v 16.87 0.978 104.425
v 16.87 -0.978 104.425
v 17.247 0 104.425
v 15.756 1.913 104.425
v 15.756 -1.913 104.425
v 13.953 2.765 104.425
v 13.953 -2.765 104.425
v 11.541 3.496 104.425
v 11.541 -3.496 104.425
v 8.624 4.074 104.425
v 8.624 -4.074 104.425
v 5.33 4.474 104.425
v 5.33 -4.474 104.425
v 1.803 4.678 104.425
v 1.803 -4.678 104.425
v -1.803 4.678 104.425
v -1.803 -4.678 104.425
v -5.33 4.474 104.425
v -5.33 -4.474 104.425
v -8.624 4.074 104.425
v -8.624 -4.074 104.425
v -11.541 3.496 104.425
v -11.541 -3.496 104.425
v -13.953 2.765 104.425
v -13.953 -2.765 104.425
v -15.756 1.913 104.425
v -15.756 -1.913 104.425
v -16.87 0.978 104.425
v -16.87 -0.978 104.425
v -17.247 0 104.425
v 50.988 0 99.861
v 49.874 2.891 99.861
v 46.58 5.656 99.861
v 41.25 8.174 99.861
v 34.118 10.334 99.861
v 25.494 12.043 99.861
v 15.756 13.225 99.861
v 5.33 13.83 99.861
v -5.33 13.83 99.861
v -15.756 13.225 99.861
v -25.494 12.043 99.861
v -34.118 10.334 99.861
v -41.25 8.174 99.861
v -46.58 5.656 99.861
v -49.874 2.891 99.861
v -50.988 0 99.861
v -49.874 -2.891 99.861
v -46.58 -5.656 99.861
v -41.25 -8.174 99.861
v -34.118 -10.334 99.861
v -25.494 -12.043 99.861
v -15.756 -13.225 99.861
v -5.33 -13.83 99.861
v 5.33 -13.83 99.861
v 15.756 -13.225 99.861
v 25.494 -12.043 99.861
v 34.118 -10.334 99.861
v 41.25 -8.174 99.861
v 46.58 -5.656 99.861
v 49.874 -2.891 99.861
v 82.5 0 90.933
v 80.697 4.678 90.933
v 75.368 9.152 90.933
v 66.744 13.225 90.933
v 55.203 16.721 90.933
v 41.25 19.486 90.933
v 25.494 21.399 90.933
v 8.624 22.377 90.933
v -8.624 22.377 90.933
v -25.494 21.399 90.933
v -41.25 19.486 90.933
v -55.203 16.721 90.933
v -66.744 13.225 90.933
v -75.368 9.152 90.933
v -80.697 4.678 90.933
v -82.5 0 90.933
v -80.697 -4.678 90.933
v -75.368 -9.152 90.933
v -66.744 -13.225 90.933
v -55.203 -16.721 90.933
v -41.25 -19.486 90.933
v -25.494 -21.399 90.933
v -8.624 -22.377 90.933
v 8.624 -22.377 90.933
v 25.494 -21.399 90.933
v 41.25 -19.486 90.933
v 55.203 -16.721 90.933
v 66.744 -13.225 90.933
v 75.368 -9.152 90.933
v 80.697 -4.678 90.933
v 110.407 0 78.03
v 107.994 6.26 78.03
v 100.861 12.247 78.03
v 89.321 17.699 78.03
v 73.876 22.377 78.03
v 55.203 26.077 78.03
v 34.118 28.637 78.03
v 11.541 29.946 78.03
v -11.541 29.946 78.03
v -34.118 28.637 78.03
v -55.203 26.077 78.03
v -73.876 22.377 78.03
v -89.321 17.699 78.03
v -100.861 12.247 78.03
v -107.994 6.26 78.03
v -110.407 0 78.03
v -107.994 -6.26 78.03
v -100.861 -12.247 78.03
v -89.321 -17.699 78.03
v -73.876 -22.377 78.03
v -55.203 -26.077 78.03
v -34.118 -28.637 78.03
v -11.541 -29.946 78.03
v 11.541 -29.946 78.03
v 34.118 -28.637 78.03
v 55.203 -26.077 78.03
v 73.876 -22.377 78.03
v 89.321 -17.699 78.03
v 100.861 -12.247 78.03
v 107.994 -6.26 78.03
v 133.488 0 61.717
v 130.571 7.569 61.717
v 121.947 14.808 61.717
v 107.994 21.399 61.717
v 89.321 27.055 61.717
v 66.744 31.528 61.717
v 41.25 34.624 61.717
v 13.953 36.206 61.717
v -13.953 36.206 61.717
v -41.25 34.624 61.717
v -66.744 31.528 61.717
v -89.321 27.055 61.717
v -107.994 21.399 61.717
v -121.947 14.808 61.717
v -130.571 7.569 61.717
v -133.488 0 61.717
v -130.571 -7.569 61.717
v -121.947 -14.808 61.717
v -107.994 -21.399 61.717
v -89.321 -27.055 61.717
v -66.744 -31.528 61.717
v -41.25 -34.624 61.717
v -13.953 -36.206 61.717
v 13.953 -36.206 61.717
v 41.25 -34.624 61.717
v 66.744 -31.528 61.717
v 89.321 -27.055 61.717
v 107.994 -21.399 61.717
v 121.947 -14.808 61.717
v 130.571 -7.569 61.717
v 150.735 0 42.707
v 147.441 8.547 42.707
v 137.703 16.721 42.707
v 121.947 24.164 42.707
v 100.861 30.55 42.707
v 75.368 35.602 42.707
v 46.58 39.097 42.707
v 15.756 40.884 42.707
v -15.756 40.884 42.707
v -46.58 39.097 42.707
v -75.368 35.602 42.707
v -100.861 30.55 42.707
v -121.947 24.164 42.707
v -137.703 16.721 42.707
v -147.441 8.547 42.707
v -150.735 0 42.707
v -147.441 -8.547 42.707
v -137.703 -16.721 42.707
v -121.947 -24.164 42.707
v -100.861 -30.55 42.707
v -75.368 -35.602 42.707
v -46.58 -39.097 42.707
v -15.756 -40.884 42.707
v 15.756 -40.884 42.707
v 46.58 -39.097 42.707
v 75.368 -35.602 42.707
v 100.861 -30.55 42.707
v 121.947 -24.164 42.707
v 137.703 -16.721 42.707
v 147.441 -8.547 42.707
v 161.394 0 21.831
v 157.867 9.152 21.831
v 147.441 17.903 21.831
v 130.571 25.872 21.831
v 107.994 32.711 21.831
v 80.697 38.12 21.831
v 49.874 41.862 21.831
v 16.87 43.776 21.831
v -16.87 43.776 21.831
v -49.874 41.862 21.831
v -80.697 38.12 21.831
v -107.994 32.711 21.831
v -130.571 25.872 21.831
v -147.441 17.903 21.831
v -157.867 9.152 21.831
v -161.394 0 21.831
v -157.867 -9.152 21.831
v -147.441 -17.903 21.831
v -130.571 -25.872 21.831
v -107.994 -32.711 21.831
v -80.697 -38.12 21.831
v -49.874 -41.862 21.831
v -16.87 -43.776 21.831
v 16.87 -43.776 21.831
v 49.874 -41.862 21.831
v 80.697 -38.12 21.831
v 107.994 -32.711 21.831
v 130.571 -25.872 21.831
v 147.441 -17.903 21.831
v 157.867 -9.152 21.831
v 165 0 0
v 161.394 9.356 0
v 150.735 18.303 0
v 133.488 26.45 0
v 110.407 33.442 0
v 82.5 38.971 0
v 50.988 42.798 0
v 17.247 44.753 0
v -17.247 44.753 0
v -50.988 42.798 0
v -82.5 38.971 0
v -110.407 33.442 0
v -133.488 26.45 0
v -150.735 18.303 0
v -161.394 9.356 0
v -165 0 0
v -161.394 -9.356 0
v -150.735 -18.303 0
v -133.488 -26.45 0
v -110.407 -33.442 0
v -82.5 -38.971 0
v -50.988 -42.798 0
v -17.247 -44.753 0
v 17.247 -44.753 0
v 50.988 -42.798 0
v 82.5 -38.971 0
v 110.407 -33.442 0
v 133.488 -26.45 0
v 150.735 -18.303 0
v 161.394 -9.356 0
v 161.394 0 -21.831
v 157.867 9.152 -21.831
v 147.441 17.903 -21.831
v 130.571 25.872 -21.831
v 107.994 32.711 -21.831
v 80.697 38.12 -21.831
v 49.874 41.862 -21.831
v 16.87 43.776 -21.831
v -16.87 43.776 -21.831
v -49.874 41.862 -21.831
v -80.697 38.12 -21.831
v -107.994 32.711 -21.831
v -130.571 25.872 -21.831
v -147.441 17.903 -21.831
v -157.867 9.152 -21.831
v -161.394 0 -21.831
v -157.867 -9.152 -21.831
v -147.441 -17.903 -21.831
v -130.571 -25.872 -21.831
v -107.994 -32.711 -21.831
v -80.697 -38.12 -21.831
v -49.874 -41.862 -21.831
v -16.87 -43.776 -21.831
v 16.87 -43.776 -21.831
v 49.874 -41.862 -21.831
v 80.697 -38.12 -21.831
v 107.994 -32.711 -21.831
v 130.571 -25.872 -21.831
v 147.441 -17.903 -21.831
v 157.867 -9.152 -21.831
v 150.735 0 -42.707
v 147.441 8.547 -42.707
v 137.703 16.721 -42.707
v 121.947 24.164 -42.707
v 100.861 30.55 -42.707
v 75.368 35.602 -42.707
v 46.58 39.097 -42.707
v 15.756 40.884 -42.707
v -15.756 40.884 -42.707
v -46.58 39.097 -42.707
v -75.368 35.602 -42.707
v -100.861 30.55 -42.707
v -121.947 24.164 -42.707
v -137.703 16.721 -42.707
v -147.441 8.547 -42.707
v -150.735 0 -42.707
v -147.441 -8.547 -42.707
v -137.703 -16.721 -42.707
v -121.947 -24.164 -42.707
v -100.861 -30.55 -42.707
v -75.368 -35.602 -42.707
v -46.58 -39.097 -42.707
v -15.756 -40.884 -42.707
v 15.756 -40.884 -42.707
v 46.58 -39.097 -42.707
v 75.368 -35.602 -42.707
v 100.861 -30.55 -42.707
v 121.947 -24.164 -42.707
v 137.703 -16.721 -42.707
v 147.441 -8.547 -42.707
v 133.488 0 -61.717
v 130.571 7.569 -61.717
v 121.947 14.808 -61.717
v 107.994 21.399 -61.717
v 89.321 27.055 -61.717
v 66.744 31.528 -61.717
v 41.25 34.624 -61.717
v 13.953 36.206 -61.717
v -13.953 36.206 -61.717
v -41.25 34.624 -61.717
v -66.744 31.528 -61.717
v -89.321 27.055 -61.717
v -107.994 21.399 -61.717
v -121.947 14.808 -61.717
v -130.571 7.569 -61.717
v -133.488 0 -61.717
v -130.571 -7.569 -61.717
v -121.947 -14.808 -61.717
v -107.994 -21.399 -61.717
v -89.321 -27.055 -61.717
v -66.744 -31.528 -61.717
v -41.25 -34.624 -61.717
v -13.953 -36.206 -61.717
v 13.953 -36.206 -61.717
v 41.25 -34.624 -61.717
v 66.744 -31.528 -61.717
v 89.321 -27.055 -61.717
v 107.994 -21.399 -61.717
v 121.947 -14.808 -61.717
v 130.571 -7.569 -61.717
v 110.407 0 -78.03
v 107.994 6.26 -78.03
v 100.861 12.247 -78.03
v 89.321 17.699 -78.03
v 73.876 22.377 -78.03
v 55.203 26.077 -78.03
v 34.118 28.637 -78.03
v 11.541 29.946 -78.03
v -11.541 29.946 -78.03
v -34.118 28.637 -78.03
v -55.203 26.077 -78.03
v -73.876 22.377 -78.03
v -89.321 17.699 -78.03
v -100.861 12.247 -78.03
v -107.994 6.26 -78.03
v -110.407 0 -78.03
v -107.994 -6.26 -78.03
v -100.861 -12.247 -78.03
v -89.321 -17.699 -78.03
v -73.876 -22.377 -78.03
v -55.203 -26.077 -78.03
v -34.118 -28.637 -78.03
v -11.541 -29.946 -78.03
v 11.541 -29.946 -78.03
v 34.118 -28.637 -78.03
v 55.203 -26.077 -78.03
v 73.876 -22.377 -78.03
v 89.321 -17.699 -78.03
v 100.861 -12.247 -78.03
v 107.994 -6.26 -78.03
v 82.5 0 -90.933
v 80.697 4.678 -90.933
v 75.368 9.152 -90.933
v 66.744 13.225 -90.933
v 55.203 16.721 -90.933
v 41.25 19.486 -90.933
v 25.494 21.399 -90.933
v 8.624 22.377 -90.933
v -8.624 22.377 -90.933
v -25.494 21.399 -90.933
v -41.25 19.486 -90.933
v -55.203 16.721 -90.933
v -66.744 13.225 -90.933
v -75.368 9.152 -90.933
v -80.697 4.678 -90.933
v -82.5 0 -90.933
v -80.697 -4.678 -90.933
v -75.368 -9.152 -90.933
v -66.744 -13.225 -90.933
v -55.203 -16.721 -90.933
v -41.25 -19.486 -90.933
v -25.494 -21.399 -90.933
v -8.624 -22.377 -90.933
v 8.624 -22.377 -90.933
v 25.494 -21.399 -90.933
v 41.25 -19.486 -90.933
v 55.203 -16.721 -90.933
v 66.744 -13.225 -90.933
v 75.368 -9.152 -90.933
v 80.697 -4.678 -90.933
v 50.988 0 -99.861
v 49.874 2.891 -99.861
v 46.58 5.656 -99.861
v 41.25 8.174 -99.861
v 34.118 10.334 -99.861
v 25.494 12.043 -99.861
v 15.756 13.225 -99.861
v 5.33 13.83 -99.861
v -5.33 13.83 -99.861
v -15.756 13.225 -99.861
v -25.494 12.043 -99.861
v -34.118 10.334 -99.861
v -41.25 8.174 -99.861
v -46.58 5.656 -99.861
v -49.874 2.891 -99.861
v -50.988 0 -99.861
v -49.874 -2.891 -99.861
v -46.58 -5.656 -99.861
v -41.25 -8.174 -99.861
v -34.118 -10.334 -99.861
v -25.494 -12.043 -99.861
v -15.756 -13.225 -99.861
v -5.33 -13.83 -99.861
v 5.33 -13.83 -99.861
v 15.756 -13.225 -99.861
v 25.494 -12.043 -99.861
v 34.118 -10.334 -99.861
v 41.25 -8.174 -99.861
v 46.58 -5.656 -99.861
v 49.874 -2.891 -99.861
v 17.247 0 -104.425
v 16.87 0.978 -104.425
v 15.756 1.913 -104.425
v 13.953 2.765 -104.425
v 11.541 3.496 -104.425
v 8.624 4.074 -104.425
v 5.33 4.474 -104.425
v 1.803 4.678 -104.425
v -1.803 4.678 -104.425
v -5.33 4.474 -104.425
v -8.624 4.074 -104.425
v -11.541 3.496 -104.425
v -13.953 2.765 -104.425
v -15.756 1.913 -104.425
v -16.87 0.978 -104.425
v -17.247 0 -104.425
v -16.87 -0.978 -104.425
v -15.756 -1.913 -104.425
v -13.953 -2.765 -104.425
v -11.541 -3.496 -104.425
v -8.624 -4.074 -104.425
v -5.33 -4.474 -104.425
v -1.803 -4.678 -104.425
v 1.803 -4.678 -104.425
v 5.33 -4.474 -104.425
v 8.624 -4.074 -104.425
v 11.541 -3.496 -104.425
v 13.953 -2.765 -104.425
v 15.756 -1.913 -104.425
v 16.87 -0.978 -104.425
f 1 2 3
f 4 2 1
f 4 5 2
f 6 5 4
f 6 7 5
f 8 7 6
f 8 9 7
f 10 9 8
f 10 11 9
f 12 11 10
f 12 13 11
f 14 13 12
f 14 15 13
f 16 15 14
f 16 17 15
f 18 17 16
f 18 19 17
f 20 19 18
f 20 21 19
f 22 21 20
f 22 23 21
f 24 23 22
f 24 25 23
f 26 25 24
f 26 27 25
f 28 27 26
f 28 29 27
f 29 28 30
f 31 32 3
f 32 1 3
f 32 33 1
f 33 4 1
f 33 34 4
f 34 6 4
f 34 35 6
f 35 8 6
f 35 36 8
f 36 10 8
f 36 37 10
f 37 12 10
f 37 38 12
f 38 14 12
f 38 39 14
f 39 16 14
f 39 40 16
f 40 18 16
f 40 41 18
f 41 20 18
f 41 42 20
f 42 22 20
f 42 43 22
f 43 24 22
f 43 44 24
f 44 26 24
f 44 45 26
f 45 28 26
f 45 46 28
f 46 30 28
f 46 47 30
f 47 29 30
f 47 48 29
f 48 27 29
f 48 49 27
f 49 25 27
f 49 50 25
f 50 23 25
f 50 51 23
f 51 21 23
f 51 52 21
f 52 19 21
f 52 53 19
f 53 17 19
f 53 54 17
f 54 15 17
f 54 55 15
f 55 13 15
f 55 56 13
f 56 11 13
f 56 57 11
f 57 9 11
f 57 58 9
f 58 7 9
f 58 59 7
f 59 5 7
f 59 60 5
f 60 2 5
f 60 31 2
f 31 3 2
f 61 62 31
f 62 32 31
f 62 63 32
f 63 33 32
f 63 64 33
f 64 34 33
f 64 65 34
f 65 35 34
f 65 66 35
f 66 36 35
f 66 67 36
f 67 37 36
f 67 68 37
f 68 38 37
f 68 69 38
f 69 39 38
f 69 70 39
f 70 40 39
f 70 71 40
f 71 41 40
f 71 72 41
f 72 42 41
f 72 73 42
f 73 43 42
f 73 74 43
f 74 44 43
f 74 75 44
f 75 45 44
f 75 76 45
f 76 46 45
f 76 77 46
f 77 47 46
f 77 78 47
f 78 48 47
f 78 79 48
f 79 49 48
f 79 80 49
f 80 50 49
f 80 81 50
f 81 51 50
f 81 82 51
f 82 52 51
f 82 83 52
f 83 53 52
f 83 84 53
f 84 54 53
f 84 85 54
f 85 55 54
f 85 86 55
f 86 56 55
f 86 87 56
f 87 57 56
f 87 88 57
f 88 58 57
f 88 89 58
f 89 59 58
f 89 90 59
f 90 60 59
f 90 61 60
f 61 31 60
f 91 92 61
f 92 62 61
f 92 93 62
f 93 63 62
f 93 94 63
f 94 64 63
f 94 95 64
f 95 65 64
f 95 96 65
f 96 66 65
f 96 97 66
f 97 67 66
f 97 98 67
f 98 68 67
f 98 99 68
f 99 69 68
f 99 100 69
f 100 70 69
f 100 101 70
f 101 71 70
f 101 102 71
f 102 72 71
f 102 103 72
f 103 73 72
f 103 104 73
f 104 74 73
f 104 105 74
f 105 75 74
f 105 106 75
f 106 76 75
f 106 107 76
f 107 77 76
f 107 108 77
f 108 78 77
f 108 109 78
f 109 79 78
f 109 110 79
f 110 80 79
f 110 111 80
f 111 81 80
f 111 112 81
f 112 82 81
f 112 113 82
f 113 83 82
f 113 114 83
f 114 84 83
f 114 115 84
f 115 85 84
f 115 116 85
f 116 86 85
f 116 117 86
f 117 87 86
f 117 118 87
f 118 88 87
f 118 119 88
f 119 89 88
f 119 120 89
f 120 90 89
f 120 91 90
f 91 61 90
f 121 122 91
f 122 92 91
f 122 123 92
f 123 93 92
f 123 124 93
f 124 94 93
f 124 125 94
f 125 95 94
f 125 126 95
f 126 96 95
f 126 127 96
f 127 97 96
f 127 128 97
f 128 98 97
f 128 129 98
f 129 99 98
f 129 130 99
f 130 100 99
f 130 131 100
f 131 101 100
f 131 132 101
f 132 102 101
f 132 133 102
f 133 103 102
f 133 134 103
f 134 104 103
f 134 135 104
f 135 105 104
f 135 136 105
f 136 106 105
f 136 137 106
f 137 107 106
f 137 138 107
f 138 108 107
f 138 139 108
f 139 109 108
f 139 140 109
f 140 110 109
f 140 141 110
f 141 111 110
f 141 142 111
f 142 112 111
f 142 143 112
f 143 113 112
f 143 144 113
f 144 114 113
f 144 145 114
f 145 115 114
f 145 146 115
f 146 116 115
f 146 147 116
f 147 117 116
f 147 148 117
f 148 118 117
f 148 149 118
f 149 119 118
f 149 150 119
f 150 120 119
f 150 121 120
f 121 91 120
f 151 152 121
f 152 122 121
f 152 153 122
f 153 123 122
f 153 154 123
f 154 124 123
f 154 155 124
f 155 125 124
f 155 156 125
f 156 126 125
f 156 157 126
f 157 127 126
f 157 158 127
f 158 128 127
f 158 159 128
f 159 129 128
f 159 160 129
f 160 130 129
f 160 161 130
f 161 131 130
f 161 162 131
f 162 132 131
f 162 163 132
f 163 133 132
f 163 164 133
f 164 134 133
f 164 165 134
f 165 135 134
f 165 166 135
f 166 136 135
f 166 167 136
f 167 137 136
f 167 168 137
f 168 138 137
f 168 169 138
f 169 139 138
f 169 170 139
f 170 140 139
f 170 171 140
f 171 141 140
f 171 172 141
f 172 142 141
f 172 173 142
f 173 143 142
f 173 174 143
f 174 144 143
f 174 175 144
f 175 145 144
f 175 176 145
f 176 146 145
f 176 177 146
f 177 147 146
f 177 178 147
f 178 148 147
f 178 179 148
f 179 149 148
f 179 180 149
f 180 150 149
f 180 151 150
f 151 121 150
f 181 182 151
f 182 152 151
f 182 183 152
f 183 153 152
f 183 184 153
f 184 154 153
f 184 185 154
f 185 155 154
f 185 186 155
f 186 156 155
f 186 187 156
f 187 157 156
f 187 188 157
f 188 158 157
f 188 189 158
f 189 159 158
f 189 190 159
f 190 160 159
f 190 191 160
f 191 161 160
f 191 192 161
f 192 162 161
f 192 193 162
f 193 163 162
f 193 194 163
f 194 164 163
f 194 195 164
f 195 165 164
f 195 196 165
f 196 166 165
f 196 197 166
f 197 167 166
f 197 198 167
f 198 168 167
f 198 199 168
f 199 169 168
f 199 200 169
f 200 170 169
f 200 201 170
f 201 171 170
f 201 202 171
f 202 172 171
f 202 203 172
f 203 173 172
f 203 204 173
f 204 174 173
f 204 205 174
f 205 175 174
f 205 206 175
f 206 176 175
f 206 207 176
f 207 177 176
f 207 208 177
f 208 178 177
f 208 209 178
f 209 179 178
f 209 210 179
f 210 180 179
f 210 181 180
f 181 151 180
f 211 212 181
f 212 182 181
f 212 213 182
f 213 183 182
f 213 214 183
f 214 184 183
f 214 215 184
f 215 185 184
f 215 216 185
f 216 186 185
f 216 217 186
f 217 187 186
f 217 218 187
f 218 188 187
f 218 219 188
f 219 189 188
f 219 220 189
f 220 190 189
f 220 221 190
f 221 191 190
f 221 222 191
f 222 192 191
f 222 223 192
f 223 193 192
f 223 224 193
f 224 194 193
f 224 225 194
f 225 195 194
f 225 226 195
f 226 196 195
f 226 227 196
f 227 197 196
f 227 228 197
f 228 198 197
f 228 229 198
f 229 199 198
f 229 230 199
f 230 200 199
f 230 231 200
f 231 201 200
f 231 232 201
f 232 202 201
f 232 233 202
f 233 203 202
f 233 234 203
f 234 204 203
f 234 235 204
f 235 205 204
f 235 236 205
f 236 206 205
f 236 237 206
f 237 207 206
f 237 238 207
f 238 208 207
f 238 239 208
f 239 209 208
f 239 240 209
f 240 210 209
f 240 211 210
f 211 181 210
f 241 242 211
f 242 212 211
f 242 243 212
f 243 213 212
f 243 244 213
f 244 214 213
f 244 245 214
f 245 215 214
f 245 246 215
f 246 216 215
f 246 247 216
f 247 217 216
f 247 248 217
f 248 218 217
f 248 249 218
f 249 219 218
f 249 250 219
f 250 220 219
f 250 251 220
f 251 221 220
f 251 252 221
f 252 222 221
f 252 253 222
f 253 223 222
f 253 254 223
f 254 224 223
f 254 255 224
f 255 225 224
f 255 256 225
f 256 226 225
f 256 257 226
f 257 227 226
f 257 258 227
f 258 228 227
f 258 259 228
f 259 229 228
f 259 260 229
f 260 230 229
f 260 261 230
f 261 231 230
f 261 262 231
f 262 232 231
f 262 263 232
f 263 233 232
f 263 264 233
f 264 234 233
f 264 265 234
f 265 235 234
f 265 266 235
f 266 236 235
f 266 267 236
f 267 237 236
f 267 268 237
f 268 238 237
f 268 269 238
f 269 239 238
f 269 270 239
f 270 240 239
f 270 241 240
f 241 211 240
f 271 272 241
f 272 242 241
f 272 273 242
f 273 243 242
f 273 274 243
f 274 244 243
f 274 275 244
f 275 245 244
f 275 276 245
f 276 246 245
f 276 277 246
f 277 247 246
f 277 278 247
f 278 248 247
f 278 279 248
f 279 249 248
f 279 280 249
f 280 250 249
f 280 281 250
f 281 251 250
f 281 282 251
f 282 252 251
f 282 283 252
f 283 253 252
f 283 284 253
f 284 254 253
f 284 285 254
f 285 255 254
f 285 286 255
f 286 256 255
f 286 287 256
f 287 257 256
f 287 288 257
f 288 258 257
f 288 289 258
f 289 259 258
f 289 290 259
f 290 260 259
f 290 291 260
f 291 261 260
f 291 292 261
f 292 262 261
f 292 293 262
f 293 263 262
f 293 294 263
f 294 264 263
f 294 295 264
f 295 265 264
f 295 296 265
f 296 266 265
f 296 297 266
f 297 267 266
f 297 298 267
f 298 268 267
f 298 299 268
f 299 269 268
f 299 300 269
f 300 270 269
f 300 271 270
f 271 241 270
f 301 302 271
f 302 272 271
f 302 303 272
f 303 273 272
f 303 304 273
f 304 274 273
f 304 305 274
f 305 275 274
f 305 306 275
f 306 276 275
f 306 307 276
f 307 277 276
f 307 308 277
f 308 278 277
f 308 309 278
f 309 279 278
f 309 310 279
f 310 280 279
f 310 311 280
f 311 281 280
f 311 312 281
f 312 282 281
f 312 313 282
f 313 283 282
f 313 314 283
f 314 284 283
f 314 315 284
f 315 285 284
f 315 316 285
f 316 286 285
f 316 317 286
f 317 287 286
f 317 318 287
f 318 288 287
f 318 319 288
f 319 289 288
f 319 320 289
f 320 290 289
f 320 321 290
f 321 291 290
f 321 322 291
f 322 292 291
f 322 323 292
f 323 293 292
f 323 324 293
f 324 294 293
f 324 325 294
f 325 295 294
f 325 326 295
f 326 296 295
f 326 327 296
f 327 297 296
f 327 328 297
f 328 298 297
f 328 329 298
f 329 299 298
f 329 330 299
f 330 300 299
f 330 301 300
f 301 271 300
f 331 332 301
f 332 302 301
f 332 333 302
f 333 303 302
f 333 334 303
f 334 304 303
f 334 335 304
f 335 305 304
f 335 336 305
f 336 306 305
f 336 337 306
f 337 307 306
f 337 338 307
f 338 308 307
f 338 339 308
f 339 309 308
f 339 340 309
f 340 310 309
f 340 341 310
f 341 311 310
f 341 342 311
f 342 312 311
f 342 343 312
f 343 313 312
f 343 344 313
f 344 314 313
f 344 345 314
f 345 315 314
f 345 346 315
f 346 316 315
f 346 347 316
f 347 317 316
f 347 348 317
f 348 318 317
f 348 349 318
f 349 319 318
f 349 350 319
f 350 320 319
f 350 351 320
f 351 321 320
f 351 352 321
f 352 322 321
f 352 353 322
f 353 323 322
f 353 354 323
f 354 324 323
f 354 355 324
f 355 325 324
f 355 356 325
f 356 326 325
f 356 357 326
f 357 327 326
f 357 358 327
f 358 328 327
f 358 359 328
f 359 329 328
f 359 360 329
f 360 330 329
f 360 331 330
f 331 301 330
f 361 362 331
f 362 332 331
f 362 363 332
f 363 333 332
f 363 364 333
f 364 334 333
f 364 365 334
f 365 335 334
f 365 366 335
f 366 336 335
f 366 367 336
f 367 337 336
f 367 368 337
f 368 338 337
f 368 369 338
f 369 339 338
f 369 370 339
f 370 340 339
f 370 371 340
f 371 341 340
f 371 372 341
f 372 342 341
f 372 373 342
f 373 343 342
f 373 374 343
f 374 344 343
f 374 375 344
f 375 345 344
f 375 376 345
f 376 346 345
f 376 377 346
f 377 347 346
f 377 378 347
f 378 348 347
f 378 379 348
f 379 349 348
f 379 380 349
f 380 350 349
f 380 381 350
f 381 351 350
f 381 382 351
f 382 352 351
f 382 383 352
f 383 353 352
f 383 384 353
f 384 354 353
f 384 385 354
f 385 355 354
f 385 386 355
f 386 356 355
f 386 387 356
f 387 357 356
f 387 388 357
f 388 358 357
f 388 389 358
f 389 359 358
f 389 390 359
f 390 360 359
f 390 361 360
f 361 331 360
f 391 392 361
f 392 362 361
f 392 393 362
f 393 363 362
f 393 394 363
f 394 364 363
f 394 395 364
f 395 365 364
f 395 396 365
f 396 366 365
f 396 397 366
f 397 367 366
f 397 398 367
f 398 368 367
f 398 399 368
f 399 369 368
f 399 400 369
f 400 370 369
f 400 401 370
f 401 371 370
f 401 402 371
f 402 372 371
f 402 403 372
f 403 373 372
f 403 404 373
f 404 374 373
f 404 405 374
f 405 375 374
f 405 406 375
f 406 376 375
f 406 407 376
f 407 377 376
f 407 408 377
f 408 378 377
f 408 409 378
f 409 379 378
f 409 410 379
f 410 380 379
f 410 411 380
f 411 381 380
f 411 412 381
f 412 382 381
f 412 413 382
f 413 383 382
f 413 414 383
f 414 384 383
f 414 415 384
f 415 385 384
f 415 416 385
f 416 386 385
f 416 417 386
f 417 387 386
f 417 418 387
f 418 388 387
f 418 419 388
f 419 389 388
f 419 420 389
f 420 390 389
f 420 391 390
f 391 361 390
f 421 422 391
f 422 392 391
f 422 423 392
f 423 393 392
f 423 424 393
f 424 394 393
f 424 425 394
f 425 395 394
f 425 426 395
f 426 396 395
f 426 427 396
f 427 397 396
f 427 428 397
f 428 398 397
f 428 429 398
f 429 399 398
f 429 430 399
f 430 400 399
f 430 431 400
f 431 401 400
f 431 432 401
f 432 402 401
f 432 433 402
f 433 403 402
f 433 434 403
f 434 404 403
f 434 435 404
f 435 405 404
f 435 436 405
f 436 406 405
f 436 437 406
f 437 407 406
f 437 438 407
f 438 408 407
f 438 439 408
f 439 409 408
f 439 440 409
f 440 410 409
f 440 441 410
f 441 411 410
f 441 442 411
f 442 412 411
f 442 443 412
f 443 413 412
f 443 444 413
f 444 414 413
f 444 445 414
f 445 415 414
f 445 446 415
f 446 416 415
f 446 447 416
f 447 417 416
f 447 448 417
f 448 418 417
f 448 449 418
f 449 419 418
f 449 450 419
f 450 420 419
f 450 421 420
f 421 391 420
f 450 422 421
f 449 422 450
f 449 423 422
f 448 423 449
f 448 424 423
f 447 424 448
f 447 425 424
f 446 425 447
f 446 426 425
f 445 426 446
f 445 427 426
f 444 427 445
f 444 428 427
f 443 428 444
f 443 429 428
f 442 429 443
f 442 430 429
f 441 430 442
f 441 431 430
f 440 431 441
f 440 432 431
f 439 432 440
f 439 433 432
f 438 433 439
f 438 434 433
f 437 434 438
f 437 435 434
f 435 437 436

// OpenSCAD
// Generated by SolidPython 1.0.1 on 2020-07-29 00:46:49


scale(v = [11, 3, 7]) {
	sphere(r = 15);
}
/***********************************************
*********      SolidPython code:      **********
************************************************
 
# import packages: SolidPython
from solid import *
from solid.utils import *
from itertools import chain, combinations, permutations


class Resize:

    def __init__(self, scad_file):
        self.scad_file = scad_file
        #self.scad_file = import_scad(scad_file)
        # cone/cylinder param:
        self.r1 = 0
        self.r2 = 0
        self.h = 0
        # rectangular prism param:
        self.w = 0
        self.l = 0
        # ellipse param:
        self.r = 0

    # import OpenScad code (file name corresponds to shape)


    # classify shape + parameters
    def assign(self, param1, param2, param3):
        if self.scad_file == 'cone.scad':
            self.r1 = param1
            self.r2 = param2
            self.h = param3
        elif self.scad_file == 'cylinder.scad':
            self.r1 = param1
            self.r2 = param2
            self.h = param3
        elif self.scad_file == 'rectangularPrism.scad':
            self.h = param1
            self.l = param2
            self.w = param3
        else:
            self.r = param1
            self.h = param2

    # resize parameters
    def iterate(self):
        x = range(3, 20, 2)
        i = 1
        if self.scad_file == 'cone.scad':
            tempList = list(permutations(x, 2))
            for temp in tempList:
                param1 = temp[0]
                param2 = temp[1]
                filepath = 'produced_scad_files/' + 'cone' + str(param1) + '_' + str(param2) + '_' + '.scad'
                scad_render_to_file(cylinder(h=param1, r1=param2, r2=0), filepath)

        elif self.scad_file == 'cylinder.scad':
            tempList = list(permutations(x, 3))
            for temp in tempList:
                param1 = temp[0]
                param2 = temp[1]
                filepath = 'produced_scad_files/' + 'cylinder' + str(param1) + '_' + str(param2) + '_' + '.scad'
                scad_render_to_file(cylinder(h=param1, r1=param2, r2=param2), filepath)

        elif self.scad_file == 'rectangularPrism.scad':
            tempList = list(permutations(x, 3))
            for temp in tempList:
                param1 = temp[0]
                param2 = temp[1]
                param3 = temp[2]
                filepath = 'produced_scad_files/' + 'rectangularPrism' + str(param1) + '_' + str(param2) + '_' + str(
                    param3) + '.scad'
                scad_render_to_file(cube(size=(param1, param2, param3)), filepath)

        elif self.scad_file == 'ellipse.scad':
            tempList = list(permutations(x, 4))
            for temp in tempList:
                param1 = temp[0]
                param2 = temp[1]
                param3 = temp[2]
                param4 = temp[3]
                filepath = 'produced_scad_files/' + 'ellipse' + str(param1) + '_' + str(param2) + '_' + str(param3) + '_' + str(param4) + '.scad'
                scad_render_to_file(scale([param1, param2, param3])(sphere(r=param4)), filepath)

    def render_to_scadfile(self):
        scad_render_to_file(scad, 'example.scad') 
 
************************************************/
